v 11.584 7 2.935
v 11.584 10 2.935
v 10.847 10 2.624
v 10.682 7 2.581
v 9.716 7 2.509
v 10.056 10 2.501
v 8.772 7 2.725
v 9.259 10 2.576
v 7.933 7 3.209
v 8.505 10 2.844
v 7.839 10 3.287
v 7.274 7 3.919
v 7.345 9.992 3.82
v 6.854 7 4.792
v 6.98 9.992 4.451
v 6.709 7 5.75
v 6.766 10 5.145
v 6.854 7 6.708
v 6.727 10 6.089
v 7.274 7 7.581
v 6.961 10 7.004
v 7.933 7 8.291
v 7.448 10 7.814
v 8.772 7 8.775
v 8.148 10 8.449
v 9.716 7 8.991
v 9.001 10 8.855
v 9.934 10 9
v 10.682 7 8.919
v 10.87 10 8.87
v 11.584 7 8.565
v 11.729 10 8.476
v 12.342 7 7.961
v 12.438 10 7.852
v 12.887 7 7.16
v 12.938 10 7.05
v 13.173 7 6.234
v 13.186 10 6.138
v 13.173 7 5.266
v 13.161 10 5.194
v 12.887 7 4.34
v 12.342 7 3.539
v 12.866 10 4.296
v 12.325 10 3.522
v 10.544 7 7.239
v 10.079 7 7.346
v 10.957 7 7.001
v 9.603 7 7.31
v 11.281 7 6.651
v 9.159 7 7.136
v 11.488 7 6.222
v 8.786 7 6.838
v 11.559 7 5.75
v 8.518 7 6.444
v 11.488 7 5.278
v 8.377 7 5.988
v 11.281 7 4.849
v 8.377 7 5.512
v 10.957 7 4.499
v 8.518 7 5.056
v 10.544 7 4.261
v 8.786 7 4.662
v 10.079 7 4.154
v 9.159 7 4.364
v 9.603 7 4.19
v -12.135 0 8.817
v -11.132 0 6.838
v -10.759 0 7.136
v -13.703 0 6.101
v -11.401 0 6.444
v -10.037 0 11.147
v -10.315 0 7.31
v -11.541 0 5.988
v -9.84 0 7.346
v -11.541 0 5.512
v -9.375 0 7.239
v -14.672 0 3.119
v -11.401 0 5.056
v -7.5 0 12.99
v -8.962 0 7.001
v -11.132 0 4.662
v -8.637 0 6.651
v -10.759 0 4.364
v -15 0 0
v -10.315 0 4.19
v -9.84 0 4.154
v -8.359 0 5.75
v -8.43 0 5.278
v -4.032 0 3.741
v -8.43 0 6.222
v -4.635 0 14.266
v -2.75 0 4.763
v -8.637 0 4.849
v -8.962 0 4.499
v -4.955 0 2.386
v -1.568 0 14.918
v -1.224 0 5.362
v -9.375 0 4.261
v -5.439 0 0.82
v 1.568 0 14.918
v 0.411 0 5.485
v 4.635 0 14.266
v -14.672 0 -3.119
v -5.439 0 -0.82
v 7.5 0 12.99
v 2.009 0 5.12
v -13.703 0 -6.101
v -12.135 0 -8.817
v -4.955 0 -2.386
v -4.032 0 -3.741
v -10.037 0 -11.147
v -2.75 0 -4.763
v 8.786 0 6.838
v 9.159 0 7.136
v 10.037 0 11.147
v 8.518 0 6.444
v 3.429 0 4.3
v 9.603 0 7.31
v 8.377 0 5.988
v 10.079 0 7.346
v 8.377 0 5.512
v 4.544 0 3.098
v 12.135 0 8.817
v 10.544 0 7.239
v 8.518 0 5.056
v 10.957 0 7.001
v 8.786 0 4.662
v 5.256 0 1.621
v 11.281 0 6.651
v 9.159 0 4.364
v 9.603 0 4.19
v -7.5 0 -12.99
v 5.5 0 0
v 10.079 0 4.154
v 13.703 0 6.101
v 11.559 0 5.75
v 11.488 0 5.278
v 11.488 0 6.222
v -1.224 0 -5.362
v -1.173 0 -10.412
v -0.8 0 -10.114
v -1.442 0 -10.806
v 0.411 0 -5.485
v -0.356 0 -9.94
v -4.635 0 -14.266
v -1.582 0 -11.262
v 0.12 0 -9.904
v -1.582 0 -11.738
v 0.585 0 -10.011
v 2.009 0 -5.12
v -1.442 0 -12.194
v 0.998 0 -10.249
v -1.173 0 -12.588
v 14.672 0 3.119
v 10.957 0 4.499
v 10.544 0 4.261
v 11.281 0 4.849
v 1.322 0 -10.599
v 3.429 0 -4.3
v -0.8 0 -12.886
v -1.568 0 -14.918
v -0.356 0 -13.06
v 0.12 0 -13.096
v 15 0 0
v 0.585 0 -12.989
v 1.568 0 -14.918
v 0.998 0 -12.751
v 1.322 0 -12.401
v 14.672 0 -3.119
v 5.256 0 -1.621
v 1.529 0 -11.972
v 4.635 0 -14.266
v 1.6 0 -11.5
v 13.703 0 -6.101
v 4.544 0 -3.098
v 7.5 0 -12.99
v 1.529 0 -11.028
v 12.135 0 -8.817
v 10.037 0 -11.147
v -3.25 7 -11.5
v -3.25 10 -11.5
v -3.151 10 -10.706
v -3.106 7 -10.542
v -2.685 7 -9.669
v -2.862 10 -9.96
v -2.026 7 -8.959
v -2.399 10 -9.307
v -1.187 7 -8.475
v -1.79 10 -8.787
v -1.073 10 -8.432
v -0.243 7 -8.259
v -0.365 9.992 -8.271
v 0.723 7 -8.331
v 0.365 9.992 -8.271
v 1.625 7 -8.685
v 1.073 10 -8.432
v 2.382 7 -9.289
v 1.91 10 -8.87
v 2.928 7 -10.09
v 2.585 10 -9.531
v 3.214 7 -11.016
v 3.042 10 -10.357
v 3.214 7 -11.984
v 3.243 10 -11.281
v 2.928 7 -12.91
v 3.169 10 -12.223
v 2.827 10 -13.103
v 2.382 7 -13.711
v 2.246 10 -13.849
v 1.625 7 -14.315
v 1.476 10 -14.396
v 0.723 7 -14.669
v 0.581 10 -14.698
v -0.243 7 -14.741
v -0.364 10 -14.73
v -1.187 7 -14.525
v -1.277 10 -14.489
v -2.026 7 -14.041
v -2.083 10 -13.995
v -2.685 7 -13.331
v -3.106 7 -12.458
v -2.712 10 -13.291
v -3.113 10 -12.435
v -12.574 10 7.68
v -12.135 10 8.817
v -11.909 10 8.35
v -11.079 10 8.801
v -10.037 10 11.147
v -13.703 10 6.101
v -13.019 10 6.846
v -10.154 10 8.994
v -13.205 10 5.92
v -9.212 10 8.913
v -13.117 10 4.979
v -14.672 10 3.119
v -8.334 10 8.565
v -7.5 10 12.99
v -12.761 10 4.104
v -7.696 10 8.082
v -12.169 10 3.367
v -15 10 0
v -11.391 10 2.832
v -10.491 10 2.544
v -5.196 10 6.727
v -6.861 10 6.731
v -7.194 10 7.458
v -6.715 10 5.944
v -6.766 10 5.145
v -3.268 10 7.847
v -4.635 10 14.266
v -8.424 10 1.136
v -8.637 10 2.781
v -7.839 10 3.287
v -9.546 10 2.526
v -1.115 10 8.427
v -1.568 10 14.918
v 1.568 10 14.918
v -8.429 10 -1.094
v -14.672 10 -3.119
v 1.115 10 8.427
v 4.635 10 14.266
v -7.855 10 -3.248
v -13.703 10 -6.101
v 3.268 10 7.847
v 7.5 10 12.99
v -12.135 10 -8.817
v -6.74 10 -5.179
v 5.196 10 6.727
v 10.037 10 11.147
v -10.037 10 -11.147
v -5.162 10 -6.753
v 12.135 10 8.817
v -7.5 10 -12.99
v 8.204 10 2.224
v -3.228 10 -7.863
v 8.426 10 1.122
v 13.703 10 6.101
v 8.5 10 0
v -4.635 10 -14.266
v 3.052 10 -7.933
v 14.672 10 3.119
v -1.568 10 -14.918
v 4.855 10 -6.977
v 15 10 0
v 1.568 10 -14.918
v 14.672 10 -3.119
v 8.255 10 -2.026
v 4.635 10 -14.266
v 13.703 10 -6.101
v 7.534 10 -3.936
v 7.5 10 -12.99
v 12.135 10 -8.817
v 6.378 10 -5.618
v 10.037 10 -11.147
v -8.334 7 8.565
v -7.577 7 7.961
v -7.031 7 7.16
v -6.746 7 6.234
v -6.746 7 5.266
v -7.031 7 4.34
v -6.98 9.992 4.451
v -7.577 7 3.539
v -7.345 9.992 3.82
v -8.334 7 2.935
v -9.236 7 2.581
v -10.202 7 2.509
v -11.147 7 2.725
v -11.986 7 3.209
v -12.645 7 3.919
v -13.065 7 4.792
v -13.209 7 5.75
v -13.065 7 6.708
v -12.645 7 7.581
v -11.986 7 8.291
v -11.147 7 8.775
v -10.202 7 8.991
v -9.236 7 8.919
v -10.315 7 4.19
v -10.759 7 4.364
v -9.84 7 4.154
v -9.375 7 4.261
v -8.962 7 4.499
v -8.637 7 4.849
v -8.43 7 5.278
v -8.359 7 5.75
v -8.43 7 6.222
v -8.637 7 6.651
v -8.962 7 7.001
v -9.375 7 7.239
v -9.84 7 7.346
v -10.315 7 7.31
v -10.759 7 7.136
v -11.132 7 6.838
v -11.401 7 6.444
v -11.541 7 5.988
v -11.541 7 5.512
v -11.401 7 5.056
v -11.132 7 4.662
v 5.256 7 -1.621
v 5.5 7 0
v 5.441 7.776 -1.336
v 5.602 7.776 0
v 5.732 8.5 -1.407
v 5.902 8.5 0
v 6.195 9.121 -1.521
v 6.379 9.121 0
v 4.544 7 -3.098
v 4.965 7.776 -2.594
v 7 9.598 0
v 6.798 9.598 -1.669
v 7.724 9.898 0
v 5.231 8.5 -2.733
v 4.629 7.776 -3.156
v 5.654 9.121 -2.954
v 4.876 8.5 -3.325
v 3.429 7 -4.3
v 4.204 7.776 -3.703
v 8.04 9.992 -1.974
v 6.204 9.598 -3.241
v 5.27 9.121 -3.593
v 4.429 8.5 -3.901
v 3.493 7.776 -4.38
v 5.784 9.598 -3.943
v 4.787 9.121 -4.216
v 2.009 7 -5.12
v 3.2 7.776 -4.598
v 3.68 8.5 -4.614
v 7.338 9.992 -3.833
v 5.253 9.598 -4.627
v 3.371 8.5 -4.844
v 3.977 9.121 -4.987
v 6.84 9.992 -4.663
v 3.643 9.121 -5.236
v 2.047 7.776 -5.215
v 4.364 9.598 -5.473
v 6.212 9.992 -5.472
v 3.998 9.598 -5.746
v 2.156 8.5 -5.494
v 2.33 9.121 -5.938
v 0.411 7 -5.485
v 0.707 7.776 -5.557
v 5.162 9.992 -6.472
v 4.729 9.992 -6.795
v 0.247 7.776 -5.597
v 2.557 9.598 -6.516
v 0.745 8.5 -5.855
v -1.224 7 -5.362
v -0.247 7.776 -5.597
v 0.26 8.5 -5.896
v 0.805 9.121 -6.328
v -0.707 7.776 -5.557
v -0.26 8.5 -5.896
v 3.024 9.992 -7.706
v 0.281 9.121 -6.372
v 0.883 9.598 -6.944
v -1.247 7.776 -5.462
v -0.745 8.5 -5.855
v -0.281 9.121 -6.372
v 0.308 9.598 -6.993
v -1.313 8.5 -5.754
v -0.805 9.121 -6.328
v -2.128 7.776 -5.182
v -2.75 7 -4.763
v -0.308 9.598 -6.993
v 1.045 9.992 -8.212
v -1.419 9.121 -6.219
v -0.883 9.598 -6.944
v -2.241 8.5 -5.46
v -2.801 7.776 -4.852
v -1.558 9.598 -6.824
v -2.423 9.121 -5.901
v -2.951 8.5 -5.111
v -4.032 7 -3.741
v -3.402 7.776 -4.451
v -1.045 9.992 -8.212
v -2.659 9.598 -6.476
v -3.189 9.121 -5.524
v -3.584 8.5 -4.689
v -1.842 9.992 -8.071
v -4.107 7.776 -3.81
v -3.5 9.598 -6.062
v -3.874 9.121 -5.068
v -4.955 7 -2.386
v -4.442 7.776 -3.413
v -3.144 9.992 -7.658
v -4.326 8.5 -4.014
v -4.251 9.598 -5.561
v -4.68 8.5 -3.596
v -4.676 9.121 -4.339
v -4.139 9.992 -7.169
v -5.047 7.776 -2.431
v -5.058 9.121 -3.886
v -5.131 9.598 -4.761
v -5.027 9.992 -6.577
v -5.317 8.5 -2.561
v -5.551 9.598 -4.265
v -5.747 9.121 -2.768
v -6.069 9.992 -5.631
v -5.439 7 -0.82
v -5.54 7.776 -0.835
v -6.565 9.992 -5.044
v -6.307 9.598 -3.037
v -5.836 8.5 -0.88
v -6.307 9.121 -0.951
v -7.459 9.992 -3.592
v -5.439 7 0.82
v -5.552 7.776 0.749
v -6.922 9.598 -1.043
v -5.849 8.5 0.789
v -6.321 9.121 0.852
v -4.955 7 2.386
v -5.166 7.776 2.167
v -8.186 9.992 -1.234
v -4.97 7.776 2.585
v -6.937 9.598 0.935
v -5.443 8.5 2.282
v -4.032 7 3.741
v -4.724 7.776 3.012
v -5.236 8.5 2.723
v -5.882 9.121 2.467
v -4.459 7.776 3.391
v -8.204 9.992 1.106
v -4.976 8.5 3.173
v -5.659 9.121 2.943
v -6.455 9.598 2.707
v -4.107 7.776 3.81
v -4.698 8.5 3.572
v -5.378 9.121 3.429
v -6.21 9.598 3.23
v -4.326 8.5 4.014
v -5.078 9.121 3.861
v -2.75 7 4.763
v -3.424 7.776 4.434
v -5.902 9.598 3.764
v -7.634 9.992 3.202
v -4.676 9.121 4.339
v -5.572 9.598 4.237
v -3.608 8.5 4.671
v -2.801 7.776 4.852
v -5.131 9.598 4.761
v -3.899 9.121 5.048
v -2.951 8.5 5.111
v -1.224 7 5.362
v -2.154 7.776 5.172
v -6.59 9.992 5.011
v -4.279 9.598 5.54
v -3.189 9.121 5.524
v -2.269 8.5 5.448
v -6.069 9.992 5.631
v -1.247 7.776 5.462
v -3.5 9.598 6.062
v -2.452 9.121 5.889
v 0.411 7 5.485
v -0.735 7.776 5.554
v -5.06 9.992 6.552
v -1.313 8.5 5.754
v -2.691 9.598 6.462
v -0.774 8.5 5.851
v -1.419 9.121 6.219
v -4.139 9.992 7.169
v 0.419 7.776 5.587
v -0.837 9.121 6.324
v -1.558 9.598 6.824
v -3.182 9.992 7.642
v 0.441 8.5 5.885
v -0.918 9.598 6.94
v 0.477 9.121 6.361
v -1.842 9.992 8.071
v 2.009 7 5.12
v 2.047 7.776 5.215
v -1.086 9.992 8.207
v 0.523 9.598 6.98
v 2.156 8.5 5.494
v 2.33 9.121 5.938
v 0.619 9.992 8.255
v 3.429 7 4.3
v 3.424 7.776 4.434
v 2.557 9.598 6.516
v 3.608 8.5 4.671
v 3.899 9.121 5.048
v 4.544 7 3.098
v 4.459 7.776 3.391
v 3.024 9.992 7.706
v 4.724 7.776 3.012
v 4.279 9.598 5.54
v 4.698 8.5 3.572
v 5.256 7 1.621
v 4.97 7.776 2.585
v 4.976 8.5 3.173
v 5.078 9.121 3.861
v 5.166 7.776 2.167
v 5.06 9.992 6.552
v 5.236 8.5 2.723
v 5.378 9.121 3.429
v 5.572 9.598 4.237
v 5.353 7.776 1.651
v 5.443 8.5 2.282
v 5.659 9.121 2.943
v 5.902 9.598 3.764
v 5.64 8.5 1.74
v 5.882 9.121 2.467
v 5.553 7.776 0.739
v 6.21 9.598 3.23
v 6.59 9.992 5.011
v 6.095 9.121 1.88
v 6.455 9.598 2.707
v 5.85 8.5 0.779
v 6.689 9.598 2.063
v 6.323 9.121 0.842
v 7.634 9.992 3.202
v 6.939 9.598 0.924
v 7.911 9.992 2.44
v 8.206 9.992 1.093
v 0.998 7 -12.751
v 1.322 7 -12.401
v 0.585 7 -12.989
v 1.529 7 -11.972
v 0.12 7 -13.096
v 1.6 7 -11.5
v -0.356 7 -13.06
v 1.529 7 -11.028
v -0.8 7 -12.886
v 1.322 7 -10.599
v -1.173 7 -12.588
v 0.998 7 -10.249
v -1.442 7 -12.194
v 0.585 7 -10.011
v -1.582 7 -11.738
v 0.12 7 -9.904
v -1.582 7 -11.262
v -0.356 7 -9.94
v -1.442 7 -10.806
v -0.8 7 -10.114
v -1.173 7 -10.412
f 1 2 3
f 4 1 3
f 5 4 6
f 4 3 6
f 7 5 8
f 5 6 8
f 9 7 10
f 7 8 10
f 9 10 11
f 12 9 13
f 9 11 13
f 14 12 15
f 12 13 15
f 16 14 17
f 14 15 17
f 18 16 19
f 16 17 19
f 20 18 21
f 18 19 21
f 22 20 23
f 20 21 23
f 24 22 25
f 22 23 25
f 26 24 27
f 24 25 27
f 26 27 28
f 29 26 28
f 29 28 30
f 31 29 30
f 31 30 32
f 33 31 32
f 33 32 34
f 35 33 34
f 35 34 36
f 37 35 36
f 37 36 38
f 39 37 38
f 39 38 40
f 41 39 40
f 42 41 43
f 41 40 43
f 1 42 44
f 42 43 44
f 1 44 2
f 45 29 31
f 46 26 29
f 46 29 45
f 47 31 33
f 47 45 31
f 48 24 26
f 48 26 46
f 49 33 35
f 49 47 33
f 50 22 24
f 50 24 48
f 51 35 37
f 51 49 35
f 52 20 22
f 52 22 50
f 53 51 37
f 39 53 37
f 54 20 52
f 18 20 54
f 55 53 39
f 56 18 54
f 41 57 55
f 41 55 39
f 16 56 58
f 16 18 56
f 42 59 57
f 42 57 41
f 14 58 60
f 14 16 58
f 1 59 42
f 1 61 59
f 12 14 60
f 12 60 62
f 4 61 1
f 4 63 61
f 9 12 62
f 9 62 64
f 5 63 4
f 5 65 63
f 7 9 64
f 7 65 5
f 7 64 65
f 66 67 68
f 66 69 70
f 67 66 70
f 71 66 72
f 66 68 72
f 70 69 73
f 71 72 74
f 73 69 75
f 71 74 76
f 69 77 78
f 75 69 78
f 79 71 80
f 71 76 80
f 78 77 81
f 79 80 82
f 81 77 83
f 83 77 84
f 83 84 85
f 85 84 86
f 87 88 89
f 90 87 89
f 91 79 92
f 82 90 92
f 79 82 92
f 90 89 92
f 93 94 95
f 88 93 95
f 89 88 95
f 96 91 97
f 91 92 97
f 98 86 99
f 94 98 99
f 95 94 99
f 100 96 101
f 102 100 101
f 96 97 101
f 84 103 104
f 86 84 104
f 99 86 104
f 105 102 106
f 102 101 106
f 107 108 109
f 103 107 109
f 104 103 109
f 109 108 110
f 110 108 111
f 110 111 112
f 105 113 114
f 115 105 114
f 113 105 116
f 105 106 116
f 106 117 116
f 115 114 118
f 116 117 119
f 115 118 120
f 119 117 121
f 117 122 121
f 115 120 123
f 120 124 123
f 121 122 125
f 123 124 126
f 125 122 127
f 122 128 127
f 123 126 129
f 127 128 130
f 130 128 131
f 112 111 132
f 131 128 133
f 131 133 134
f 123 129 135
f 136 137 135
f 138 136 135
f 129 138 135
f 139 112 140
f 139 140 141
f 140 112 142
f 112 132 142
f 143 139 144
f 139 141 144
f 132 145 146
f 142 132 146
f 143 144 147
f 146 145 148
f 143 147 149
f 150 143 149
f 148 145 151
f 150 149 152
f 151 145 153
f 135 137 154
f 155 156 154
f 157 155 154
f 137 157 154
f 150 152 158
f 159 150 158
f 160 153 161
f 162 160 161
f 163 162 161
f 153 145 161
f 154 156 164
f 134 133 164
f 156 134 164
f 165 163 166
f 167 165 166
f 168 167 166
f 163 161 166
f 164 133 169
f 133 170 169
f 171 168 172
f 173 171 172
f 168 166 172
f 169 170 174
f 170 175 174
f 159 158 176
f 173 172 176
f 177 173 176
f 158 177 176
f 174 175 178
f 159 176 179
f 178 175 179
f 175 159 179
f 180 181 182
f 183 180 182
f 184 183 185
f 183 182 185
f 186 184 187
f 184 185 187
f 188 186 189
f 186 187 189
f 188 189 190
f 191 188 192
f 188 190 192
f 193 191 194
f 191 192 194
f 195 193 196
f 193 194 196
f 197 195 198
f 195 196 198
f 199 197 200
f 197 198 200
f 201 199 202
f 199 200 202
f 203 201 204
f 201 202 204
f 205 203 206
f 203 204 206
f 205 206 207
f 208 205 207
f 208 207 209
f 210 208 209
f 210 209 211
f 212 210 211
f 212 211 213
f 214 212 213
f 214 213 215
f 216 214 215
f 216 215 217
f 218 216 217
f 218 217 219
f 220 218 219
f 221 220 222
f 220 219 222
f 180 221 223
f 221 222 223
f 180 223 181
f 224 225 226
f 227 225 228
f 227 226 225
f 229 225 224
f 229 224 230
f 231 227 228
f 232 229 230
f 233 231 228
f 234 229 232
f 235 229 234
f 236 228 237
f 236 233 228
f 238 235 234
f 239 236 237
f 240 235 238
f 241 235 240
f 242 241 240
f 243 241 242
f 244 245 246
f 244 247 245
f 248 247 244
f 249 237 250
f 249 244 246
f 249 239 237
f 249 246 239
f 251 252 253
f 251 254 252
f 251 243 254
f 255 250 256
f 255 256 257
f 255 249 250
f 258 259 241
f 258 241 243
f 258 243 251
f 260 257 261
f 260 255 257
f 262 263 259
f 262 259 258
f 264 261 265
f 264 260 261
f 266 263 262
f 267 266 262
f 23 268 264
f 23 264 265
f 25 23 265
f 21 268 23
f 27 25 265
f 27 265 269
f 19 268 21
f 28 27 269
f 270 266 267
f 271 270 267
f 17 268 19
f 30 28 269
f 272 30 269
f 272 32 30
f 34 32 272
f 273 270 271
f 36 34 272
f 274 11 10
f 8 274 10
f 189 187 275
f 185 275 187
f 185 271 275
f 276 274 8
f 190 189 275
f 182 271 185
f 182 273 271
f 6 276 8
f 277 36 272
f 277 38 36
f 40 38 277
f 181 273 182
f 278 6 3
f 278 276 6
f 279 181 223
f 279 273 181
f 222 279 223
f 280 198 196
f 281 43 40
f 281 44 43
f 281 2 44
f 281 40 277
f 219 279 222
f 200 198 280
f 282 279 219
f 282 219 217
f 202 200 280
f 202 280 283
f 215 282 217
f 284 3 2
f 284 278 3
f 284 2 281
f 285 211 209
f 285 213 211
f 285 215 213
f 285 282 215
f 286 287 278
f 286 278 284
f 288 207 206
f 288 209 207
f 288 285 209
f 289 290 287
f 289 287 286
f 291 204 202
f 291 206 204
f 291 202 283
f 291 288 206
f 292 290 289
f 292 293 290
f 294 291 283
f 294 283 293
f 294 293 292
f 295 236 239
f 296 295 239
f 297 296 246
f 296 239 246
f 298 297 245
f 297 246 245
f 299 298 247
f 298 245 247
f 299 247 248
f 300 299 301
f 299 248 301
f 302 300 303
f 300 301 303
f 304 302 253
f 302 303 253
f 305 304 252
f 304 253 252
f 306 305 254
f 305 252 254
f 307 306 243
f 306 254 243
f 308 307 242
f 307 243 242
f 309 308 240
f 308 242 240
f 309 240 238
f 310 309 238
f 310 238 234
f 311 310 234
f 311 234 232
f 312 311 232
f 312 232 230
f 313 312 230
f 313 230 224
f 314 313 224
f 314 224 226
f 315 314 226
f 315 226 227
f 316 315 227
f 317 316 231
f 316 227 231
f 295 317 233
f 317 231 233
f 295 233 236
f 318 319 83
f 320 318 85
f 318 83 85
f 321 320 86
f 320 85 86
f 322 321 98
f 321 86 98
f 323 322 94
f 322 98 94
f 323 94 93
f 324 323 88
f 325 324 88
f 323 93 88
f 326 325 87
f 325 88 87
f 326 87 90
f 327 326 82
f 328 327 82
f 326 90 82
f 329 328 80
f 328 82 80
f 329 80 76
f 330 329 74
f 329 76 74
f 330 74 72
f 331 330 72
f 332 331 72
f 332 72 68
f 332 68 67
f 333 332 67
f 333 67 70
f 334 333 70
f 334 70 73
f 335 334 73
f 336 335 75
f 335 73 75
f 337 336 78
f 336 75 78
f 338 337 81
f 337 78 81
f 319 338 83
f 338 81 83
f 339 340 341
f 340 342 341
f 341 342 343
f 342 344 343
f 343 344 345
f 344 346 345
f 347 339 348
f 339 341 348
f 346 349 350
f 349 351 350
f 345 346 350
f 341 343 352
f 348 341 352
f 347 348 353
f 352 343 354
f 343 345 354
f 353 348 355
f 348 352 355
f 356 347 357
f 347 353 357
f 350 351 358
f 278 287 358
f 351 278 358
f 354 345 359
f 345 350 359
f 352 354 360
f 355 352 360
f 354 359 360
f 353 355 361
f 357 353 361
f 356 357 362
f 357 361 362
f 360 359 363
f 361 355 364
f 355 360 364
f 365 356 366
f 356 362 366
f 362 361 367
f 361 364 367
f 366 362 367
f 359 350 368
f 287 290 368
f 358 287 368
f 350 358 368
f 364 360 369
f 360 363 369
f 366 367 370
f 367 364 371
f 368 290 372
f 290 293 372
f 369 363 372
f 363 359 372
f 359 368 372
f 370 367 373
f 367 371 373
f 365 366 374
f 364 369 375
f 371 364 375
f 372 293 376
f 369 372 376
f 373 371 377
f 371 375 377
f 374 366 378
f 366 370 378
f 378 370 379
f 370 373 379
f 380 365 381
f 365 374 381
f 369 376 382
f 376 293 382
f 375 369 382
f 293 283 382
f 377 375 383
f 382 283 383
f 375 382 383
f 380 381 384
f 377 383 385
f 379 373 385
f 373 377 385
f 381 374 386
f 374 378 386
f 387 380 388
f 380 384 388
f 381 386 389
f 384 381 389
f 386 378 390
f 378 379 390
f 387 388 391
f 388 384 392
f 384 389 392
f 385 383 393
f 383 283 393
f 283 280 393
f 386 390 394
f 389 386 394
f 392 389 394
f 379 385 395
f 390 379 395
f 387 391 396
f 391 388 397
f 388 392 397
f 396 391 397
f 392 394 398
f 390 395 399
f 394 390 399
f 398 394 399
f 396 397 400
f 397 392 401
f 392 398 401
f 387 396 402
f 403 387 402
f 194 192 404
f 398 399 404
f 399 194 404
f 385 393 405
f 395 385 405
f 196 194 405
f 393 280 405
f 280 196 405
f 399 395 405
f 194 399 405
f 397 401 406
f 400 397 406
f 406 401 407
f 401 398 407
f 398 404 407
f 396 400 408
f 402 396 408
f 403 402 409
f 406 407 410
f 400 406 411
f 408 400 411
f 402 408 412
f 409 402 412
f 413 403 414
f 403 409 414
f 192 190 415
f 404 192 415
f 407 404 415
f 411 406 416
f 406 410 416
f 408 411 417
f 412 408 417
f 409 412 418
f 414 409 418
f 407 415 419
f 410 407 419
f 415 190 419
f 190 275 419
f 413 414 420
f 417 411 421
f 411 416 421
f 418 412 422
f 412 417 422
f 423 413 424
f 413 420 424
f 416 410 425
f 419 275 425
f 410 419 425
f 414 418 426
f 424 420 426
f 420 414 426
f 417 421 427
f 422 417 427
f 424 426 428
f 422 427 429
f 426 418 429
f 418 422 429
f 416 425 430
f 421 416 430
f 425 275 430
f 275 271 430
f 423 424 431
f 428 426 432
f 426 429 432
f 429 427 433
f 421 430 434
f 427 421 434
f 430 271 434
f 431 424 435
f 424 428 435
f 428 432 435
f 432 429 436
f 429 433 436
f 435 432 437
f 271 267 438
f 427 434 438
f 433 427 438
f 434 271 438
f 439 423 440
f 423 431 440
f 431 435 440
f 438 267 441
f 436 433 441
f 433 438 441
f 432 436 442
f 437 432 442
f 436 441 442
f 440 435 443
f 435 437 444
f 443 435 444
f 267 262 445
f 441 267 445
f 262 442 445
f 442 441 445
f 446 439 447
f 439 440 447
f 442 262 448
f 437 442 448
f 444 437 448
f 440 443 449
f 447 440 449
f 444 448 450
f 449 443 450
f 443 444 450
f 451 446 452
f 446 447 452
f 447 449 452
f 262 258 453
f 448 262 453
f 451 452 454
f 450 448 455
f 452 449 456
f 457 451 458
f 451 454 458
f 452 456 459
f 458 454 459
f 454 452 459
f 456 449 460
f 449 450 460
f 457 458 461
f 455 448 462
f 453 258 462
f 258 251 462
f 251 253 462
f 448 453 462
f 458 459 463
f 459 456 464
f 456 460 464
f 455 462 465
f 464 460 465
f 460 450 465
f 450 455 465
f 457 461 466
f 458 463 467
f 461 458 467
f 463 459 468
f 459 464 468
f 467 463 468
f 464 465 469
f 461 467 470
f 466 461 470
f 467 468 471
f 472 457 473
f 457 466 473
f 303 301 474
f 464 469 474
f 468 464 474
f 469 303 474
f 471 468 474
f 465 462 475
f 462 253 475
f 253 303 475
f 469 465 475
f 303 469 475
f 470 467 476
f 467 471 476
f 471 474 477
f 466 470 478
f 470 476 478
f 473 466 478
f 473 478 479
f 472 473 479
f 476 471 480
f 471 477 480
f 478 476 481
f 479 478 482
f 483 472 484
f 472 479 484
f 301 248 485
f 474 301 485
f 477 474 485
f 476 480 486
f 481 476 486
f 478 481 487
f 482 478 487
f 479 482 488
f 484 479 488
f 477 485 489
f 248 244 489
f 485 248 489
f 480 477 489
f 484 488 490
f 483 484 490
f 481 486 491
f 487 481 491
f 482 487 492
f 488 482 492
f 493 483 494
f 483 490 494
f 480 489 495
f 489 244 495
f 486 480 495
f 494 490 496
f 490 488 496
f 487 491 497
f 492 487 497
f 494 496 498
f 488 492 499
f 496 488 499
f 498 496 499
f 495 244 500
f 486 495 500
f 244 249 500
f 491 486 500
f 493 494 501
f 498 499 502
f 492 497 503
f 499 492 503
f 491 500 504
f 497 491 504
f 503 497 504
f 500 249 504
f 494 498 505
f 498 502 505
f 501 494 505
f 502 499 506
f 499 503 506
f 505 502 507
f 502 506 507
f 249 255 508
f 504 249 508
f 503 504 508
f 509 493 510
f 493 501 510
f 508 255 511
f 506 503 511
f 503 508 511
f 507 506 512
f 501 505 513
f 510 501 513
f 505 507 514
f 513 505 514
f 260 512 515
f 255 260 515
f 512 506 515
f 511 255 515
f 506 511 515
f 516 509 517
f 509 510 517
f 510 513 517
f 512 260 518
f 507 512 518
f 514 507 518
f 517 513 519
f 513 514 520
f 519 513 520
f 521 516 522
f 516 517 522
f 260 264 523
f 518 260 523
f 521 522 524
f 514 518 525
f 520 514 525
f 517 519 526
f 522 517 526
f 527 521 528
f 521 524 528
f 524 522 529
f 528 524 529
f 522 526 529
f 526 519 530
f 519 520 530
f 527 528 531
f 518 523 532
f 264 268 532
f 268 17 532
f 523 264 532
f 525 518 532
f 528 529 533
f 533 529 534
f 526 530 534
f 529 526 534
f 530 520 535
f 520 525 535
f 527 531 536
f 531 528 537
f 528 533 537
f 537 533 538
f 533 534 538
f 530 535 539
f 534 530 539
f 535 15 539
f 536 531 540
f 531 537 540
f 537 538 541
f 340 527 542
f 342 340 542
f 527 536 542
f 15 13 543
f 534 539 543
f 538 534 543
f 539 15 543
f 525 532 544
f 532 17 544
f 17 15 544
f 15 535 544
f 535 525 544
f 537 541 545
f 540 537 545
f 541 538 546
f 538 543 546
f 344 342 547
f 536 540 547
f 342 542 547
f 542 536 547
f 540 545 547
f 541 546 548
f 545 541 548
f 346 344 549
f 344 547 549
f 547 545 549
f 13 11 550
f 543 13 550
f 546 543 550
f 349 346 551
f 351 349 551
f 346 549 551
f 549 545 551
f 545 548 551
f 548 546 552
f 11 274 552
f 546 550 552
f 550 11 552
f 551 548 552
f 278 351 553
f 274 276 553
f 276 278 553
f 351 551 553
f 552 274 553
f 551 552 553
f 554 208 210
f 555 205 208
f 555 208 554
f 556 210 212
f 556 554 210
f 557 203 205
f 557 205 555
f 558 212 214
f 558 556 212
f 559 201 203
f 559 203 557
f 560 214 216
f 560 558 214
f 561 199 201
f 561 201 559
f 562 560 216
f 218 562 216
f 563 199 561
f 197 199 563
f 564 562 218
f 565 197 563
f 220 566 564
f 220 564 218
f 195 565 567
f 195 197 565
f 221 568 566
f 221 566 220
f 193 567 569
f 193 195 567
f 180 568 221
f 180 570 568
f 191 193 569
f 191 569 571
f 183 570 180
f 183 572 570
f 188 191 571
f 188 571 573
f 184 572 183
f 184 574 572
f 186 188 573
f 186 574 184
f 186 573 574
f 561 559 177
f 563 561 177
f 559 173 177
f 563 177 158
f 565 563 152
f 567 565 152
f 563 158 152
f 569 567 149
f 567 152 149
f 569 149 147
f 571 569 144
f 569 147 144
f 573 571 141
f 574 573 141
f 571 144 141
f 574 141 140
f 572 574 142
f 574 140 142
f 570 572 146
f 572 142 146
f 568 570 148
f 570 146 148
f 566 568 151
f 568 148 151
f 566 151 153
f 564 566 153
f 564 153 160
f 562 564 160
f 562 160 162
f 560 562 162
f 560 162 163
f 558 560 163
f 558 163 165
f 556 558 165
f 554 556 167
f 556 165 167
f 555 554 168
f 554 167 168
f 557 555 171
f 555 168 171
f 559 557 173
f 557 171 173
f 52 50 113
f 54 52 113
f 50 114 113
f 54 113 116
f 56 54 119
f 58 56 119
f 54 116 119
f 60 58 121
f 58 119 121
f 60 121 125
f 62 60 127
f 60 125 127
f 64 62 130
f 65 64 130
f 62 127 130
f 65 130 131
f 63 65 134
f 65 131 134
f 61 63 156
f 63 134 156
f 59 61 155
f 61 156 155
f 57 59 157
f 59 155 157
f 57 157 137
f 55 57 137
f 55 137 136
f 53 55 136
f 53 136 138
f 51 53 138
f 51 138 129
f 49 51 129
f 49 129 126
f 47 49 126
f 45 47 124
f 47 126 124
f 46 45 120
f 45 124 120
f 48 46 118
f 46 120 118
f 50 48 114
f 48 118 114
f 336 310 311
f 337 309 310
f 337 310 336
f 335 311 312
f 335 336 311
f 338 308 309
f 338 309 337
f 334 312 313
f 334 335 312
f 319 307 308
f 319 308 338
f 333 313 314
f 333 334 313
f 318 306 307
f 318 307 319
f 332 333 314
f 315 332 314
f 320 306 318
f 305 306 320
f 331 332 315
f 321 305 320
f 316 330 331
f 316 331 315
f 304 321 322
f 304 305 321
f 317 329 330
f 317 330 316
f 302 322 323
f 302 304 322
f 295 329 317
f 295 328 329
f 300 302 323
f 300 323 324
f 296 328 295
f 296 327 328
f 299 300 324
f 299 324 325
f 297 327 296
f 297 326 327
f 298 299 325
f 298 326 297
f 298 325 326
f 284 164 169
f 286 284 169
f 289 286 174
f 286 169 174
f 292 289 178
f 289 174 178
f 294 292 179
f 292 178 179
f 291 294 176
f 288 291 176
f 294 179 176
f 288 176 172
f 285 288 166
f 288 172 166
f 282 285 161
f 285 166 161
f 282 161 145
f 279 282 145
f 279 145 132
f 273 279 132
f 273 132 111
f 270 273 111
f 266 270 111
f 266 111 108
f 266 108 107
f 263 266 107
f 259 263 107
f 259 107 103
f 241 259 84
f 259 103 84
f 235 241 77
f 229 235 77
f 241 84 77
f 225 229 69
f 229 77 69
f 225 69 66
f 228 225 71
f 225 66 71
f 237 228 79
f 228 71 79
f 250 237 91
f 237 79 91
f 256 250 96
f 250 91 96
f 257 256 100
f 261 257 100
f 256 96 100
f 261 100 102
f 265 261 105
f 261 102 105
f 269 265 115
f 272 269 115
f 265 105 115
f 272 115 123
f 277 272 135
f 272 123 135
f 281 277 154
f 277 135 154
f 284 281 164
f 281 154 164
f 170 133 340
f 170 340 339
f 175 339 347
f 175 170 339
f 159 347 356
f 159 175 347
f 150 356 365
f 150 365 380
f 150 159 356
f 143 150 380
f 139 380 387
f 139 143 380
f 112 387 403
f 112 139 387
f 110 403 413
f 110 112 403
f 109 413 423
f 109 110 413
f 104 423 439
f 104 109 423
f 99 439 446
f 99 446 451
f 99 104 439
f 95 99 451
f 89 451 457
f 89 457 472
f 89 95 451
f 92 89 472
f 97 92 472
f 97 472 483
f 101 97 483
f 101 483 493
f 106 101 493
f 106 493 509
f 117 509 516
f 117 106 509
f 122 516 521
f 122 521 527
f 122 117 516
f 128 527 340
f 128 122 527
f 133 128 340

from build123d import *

# Parameters (mm, degrees)
SKETCH1_R                      = 15
SKETCH1_R_2                    = 5.5
BOSS_EXTRUDE1_DEPTH            = 10
FILLET1_R                      = 3
CBORE_FOR_M3_SHCS1_D           = 3.2
CBORE_FOR_M3_SHCS1_CBORE_D     = 6.5
CBORE_FOR_M3_SHCS1_CBORE_DEPTH = 3
CIRPATTERN1_COUNT              = 3


with BuildPart() as part:
    # Sketch1 → Boss-Extrude1 (new body)
    with BuildSketch(Plane(origin=(0, 0, 0), x_dir=(1, 0, 0), z_dir=(0, 1, 0))):
        Circle(SKETCH1_R)
        Circle(SKETCH1_R_2, mode=Mode.SUBTRACT)
    extrude(amount=BOSS_EXTRUDE1_DEPTH)

    # Fillet1
    fillet1_edges = [part.edges().sort_by_distance(p)[0] for p in [
        (-5.5, 10, 0),
    ]]
    fillet(fillet1_edges, radius=FILLET1_R)

    # CBORE for M3 SHCS1 (through all)
    with Locations(Plane(origin=(0, 10, 0), x_dir=(-1, 0, 0), z_dir=(0, 1, 0))):
        with Locations((0, -11.5)):
            cbore_for_m3_shcs1 = CounterBoreHole(CBORE_FOR_M3_SHCS1_D / 2, CBORE_FOR_M3_SHCS1_CBORE_D / 2, CBORE_FOR_M3_SHCS1_CBORE_DEPTH)

    # CirPattern1: CBORE for M3 SHCS1 ×3 about axis
    cirpattern1_axis = Axis((0, 8, 0), (0, -1, 0))
    for i in range(1, CIRPATTERN1_COUNT):
        add(cbore_for_m3_shcs1.rotate(cirpattern1_axis, i * 360 / CIRPATTERN1_COUNT), mode=Mode.SUBTRACT)


solid = part.part
